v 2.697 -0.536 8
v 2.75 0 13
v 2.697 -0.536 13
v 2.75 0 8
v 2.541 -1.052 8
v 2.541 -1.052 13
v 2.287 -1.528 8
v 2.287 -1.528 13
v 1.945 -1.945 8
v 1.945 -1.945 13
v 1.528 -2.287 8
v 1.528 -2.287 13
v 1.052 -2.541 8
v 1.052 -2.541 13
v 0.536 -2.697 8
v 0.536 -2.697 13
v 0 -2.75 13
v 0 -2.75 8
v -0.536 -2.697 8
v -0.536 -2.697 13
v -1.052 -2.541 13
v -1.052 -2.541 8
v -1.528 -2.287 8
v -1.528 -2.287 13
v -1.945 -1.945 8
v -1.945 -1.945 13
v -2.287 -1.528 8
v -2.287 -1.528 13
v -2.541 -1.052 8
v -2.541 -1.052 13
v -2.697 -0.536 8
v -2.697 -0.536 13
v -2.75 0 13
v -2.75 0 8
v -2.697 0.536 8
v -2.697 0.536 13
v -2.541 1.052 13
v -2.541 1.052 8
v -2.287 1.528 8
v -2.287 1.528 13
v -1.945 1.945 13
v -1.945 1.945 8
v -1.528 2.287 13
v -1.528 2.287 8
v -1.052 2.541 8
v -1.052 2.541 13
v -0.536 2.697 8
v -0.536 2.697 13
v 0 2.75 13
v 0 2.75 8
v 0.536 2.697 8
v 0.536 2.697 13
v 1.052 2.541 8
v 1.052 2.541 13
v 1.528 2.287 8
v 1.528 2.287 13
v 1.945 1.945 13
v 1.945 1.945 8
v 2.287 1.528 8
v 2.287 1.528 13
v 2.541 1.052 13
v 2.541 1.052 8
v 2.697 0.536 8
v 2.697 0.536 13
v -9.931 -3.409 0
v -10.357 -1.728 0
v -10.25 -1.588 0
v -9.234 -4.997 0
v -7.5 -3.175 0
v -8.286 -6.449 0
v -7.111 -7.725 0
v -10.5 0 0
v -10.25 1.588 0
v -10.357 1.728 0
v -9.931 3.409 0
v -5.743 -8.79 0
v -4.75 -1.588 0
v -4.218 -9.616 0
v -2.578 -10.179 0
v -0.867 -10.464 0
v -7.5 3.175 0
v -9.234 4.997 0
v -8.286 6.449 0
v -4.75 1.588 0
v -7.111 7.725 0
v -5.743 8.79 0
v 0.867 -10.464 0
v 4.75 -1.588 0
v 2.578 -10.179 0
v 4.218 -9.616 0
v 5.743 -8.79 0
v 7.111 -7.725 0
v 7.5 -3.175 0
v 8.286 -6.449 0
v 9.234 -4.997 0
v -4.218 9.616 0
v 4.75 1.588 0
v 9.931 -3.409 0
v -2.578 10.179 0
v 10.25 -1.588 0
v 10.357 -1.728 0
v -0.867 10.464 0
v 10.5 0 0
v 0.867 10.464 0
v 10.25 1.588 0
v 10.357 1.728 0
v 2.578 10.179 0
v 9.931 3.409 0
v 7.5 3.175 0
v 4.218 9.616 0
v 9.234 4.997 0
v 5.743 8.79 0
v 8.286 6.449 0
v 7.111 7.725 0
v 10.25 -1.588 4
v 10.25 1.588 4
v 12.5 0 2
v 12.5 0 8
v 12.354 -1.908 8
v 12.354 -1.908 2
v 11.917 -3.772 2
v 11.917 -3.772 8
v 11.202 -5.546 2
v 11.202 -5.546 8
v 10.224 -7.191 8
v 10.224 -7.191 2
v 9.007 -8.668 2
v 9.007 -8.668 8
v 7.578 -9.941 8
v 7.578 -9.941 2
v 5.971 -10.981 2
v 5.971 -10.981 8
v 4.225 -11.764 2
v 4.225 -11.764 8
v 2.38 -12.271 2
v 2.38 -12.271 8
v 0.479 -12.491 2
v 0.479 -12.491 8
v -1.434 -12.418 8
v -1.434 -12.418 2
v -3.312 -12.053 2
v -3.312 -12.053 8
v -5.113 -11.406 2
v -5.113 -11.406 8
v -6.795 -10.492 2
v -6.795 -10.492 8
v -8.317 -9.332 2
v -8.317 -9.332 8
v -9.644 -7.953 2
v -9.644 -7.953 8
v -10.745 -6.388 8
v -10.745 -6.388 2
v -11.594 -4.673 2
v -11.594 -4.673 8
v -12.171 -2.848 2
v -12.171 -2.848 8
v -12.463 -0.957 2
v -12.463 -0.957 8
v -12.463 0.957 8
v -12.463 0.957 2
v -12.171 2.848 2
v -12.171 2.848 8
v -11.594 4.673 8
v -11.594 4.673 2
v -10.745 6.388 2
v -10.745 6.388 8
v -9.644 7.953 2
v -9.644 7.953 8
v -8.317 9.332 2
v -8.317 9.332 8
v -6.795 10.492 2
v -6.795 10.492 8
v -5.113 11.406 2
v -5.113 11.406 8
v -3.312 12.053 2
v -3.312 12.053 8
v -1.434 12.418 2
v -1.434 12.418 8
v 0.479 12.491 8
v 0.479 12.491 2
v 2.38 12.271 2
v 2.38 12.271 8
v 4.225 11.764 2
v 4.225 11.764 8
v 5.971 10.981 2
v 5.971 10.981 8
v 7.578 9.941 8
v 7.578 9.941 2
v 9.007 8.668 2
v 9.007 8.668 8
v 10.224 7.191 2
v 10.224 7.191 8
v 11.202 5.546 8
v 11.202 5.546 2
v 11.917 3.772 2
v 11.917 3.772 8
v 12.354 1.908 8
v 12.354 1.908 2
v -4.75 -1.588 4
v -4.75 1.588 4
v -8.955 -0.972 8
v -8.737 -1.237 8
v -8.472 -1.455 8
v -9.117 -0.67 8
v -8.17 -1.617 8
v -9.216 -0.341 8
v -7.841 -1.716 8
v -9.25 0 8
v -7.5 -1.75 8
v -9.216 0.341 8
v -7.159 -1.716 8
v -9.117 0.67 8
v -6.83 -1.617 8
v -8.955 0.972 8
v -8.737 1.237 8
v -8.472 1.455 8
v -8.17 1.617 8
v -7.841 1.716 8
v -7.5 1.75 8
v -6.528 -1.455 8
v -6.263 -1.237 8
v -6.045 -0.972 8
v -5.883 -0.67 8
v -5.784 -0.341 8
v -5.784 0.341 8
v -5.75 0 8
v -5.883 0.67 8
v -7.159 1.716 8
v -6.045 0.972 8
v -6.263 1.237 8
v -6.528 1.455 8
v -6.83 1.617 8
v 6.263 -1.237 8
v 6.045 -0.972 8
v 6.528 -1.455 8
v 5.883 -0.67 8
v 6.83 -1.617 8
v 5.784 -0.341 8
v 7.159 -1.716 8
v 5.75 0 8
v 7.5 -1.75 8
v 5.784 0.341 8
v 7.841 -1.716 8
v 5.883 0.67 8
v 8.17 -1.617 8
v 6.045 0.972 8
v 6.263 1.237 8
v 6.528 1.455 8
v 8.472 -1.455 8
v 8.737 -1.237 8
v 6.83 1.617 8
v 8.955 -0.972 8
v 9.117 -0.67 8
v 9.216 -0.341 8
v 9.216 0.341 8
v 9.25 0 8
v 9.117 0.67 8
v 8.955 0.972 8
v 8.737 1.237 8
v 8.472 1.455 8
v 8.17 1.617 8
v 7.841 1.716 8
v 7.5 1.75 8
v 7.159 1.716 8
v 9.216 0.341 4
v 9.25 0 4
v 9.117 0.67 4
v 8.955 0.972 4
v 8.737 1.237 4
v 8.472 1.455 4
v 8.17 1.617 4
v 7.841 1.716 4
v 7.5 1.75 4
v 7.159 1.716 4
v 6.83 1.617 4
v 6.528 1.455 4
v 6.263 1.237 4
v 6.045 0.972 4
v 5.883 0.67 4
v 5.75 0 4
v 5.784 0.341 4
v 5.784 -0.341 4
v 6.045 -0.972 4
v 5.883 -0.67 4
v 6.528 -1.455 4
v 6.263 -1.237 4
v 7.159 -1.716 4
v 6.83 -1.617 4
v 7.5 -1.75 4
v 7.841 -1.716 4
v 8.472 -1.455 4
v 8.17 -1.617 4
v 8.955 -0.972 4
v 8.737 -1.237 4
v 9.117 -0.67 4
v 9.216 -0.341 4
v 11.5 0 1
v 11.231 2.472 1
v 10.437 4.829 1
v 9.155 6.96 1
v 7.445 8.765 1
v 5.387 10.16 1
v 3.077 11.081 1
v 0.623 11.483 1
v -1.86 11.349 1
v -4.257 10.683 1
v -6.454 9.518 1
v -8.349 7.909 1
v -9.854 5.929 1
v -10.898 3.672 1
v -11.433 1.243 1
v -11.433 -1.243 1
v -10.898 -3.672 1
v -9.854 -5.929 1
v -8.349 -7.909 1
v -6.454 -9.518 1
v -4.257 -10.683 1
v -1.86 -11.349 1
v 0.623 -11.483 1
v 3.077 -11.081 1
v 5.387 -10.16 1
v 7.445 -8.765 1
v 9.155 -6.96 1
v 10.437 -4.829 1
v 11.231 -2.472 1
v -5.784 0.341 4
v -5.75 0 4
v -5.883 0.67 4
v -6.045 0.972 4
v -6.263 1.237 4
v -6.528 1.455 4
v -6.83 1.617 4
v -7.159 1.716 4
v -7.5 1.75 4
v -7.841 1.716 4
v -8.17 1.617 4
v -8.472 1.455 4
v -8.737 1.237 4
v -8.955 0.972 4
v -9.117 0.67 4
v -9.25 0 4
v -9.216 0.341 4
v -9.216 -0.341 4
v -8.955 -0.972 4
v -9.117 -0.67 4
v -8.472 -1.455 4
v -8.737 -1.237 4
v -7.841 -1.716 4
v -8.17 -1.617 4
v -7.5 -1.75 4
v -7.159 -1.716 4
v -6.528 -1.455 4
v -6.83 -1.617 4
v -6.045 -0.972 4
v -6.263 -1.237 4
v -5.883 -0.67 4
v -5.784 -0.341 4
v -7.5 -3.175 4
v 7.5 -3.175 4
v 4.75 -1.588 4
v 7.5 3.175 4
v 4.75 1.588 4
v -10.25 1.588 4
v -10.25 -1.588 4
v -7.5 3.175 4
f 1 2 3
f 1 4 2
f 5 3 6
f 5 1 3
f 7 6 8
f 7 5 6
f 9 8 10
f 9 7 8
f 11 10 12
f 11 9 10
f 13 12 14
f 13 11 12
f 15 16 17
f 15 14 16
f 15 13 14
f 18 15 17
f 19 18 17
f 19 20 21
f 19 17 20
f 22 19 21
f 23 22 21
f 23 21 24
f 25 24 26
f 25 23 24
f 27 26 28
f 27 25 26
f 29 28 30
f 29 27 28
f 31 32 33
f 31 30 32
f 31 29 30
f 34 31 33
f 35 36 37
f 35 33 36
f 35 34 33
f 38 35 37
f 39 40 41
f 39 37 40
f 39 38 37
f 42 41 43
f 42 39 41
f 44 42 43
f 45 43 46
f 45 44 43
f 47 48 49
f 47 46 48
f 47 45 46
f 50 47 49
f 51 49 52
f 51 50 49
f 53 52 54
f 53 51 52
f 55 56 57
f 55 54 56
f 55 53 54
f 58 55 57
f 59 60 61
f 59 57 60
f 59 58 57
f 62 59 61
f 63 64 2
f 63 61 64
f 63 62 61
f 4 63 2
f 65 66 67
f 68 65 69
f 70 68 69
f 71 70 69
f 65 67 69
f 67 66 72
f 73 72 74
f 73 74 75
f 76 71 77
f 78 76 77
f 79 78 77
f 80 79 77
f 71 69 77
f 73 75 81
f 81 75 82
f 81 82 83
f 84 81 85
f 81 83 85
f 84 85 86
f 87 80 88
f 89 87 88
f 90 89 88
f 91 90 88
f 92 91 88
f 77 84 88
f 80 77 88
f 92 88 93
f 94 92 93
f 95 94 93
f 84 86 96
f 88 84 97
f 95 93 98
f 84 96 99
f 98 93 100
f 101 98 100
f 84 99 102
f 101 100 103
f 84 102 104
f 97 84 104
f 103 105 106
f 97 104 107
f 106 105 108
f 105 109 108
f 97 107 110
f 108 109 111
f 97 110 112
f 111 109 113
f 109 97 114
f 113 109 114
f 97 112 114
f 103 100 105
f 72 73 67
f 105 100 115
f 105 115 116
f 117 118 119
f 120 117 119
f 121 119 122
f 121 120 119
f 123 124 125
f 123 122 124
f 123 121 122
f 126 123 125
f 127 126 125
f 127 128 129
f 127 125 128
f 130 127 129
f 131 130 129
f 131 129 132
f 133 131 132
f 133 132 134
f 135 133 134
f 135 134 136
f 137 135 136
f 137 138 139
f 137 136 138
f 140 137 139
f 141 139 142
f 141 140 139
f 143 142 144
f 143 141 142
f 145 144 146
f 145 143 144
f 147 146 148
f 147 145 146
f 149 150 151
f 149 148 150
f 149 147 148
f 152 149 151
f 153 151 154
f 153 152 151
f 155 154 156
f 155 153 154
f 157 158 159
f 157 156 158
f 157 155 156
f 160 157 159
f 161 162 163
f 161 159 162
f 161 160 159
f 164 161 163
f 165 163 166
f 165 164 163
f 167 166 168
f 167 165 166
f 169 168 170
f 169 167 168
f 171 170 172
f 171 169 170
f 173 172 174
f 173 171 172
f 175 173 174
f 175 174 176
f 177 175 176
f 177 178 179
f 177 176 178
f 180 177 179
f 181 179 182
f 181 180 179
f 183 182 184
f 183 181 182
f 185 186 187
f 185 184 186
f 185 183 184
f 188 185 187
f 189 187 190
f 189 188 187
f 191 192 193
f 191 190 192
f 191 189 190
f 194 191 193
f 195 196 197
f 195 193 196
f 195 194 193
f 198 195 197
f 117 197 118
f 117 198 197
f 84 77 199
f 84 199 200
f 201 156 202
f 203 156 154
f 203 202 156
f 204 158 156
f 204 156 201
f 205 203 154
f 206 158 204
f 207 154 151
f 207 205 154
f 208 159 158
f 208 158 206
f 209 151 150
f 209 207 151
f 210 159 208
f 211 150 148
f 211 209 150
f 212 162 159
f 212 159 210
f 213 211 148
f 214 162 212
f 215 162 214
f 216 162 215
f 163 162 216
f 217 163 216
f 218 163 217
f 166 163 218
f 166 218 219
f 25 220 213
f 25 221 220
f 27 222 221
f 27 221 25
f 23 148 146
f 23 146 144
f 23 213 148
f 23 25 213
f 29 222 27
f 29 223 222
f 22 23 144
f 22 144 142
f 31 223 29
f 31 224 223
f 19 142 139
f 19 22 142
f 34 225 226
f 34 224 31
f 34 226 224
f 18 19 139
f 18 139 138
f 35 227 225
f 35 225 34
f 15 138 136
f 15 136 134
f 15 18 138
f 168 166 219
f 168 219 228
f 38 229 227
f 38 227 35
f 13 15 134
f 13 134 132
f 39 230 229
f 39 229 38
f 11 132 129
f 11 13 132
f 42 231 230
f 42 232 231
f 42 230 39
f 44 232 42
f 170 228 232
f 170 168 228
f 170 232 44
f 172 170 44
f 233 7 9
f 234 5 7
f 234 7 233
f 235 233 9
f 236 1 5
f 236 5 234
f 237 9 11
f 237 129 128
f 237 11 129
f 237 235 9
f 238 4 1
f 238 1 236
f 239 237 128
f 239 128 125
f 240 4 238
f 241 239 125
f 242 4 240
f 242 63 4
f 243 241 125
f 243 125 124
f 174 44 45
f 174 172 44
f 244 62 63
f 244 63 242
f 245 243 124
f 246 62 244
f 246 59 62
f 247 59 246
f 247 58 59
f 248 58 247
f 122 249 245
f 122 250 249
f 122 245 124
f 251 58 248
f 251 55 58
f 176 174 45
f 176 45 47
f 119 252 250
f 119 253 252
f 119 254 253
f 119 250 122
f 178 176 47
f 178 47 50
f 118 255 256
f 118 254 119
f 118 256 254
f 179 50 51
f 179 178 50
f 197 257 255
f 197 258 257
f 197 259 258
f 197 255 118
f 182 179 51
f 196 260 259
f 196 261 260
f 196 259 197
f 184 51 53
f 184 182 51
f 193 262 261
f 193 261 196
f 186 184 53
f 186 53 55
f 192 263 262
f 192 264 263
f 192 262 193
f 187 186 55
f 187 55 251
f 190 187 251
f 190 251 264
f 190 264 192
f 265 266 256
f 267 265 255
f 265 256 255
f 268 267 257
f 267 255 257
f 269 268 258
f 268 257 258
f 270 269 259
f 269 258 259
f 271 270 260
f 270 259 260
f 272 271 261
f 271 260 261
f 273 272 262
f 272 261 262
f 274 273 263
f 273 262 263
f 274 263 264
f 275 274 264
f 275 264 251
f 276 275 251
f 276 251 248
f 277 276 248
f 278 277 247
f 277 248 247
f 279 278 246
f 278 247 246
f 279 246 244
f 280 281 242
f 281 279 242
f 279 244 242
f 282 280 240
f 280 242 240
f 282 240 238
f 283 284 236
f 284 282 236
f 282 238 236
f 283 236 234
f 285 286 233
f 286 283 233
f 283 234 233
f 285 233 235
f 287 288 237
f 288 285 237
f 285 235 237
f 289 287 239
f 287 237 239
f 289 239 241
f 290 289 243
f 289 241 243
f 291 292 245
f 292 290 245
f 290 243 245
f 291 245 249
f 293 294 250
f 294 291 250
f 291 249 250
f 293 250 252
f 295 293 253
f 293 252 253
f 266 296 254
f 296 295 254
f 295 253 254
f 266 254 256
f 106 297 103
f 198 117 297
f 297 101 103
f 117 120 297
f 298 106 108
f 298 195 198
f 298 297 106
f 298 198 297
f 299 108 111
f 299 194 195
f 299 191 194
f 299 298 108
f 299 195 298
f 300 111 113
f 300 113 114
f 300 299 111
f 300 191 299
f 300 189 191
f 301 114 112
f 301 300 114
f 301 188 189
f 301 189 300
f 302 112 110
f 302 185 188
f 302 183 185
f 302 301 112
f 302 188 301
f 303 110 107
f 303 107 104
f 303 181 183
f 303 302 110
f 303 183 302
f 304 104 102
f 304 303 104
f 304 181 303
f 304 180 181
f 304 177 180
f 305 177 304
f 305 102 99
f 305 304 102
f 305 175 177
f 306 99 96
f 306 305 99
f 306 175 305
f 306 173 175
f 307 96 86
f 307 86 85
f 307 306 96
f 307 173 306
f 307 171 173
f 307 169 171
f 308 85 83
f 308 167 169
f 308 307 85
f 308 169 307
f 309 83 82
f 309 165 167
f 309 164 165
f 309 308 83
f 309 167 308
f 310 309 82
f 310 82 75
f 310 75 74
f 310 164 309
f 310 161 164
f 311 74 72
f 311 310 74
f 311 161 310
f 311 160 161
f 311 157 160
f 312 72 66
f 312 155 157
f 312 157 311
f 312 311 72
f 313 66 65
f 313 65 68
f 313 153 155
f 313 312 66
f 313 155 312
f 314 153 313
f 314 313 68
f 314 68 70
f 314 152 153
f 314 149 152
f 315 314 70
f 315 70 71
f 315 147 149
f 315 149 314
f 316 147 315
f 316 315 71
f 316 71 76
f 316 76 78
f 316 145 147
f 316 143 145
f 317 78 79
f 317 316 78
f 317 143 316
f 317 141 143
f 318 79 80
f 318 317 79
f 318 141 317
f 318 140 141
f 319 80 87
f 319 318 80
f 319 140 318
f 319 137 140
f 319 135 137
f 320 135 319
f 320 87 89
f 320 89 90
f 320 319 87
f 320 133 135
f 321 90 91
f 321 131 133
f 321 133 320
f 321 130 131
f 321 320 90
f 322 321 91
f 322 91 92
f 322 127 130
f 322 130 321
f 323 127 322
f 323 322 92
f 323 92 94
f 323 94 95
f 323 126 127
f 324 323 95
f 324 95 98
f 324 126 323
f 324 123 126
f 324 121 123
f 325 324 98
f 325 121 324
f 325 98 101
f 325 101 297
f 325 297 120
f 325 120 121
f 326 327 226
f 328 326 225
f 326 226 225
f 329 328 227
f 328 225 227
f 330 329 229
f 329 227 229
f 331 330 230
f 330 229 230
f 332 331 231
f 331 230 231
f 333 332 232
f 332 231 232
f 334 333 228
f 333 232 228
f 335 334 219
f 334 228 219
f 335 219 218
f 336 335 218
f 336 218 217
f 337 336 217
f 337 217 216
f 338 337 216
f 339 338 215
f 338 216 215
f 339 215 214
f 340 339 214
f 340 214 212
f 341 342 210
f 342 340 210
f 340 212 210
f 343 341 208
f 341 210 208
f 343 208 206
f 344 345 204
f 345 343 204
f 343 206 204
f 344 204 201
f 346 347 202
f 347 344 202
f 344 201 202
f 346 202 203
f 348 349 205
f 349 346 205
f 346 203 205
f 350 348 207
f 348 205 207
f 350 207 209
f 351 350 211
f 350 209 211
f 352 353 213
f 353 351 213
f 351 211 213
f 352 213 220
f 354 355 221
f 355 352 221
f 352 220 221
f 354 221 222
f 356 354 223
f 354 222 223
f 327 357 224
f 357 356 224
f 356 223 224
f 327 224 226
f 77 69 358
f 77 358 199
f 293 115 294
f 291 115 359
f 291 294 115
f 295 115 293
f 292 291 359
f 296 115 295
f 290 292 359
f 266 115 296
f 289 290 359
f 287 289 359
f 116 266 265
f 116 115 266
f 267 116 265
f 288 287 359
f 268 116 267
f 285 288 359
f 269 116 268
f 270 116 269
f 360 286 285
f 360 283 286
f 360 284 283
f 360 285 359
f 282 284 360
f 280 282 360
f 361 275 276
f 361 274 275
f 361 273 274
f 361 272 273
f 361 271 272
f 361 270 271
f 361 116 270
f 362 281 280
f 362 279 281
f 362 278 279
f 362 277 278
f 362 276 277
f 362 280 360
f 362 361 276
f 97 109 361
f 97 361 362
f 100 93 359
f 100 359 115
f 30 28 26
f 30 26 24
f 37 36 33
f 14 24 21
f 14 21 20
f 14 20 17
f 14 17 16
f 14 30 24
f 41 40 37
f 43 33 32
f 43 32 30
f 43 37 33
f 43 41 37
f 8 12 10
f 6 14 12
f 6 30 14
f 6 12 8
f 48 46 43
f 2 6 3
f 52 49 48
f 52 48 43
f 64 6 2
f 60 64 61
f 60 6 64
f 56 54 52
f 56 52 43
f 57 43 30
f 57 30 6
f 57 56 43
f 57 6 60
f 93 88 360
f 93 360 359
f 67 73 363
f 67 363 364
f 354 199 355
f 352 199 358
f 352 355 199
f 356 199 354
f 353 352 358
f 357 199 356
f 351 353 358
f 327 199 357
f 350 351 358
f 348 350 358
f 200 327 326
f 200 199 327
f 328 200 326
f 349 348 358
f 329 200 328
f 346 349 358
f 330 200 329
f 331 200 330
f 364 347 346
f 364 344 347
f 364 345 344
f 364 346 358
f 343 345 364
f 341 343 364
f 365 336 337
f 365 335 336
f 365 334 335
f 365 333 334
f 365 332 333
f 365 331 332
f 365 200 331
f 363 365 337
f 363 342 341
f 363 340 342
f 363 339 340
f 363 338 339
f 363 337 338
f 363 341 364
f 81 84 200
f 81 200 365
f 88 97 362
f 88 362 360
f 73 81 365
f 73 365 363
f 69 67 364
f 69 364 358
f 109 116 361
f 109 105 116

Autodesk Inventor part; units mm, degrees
ref_plane "YZ Plane" through (0, 0, 0) normal (1, 0, 0) x (0, 1, 0)
ref_plane "XZ Plane" through (0, 0, 0) normal (0, 1, 0) x (-1, 0, 0)
ref_plane "XY Plane" through (0, 0, 0) normal (0, 0, 1) x (1, 0, 0)
sketch "Sketch1" plane through (0, 0, 0) normal (0, 0, 1) x (1, 0, 0)
  circle A0 centre (0, 0) radius 12.5
  dimension "d0" = 25
extrude "Extrusion1" add sketch "Sketch1" along normal blind 8
sketch "Sketch2" plane through (0, 0, 8) normal (0, 0, 1) x (1, 0, 0)
  circle A0 centre (0, 0) radius 12.5 projected
  circle A1 centre (0, 0) radius 2.75
  dimension "d4" = 5.5
extrude "Extrusion2" add sketch "Sketch2" along normal blind 5 contours A1
sketch "Sketch3" plane through (0, 0, 8) normal (0, 0, 1) x (1, 0, 0)
  circle A0 centre (0, 0) radius 2.75 projected
  circle A1 centre (-7.5, 0) radius 1.75
  circle A2 centre (7.5, 0) radius 1.75
  dimension "d8" = 7.5
  dimension "d9" = 7.5
  dimension "d10" = 3.5
extrude "Extrusion3" cut sketch "Sketch3" against normal through all contours A1 | A2
sketch "Sketch4" plane through (0, 0, 0) normal (0, 0, -1) x (-1, 0, 0)
  circle A0 centre (7.5, 0) radius 1.75 projected
  circle A1 centre (-7.5, 0) radius 1.75 projected
  line L0 (-7.5, 3.1754) -> (-4.75, 1.5877)
  line L1 (-4.75, 1.5877) -> (-4.75, -1.5877)
  line L2 (-4.75, -1.5877) -> (-7.5, -3.1754)
  line L3 (-7.5, -3.1754) -> (-10.25, -1.5877)
  line L4 (-10.25, -1.5877) -> (-10.25, 1.5877)
  line L5 (-10.25, 1.5877) -> (-7.5, 3.1754)
  line L6 (7.5, 3.1754) -> (10.25, 1.5877)
  line L7 (10.25, 1.5877) -> (10.25, -1.5877)
  line L8 (10.25, -1.5877) -> (7.5, -3.1754)
  line L9 (7.5, -3.1754) -> (4.75, -1.5877)
  line L10 (4.75, -1.5877) -> (4.75, 1.5877)
  line L11 (4.75, 1.5877) -> (7.5, 3.1754)
  dimension "d13" = 5.5
extrude "Extrusion4" cut sketch "Sketch4" against normal blind 4
chamfer "Chamfer2" distance 2 angle 45 1 edges at (-12.5, 0, 0)
properties part number "stopper"
